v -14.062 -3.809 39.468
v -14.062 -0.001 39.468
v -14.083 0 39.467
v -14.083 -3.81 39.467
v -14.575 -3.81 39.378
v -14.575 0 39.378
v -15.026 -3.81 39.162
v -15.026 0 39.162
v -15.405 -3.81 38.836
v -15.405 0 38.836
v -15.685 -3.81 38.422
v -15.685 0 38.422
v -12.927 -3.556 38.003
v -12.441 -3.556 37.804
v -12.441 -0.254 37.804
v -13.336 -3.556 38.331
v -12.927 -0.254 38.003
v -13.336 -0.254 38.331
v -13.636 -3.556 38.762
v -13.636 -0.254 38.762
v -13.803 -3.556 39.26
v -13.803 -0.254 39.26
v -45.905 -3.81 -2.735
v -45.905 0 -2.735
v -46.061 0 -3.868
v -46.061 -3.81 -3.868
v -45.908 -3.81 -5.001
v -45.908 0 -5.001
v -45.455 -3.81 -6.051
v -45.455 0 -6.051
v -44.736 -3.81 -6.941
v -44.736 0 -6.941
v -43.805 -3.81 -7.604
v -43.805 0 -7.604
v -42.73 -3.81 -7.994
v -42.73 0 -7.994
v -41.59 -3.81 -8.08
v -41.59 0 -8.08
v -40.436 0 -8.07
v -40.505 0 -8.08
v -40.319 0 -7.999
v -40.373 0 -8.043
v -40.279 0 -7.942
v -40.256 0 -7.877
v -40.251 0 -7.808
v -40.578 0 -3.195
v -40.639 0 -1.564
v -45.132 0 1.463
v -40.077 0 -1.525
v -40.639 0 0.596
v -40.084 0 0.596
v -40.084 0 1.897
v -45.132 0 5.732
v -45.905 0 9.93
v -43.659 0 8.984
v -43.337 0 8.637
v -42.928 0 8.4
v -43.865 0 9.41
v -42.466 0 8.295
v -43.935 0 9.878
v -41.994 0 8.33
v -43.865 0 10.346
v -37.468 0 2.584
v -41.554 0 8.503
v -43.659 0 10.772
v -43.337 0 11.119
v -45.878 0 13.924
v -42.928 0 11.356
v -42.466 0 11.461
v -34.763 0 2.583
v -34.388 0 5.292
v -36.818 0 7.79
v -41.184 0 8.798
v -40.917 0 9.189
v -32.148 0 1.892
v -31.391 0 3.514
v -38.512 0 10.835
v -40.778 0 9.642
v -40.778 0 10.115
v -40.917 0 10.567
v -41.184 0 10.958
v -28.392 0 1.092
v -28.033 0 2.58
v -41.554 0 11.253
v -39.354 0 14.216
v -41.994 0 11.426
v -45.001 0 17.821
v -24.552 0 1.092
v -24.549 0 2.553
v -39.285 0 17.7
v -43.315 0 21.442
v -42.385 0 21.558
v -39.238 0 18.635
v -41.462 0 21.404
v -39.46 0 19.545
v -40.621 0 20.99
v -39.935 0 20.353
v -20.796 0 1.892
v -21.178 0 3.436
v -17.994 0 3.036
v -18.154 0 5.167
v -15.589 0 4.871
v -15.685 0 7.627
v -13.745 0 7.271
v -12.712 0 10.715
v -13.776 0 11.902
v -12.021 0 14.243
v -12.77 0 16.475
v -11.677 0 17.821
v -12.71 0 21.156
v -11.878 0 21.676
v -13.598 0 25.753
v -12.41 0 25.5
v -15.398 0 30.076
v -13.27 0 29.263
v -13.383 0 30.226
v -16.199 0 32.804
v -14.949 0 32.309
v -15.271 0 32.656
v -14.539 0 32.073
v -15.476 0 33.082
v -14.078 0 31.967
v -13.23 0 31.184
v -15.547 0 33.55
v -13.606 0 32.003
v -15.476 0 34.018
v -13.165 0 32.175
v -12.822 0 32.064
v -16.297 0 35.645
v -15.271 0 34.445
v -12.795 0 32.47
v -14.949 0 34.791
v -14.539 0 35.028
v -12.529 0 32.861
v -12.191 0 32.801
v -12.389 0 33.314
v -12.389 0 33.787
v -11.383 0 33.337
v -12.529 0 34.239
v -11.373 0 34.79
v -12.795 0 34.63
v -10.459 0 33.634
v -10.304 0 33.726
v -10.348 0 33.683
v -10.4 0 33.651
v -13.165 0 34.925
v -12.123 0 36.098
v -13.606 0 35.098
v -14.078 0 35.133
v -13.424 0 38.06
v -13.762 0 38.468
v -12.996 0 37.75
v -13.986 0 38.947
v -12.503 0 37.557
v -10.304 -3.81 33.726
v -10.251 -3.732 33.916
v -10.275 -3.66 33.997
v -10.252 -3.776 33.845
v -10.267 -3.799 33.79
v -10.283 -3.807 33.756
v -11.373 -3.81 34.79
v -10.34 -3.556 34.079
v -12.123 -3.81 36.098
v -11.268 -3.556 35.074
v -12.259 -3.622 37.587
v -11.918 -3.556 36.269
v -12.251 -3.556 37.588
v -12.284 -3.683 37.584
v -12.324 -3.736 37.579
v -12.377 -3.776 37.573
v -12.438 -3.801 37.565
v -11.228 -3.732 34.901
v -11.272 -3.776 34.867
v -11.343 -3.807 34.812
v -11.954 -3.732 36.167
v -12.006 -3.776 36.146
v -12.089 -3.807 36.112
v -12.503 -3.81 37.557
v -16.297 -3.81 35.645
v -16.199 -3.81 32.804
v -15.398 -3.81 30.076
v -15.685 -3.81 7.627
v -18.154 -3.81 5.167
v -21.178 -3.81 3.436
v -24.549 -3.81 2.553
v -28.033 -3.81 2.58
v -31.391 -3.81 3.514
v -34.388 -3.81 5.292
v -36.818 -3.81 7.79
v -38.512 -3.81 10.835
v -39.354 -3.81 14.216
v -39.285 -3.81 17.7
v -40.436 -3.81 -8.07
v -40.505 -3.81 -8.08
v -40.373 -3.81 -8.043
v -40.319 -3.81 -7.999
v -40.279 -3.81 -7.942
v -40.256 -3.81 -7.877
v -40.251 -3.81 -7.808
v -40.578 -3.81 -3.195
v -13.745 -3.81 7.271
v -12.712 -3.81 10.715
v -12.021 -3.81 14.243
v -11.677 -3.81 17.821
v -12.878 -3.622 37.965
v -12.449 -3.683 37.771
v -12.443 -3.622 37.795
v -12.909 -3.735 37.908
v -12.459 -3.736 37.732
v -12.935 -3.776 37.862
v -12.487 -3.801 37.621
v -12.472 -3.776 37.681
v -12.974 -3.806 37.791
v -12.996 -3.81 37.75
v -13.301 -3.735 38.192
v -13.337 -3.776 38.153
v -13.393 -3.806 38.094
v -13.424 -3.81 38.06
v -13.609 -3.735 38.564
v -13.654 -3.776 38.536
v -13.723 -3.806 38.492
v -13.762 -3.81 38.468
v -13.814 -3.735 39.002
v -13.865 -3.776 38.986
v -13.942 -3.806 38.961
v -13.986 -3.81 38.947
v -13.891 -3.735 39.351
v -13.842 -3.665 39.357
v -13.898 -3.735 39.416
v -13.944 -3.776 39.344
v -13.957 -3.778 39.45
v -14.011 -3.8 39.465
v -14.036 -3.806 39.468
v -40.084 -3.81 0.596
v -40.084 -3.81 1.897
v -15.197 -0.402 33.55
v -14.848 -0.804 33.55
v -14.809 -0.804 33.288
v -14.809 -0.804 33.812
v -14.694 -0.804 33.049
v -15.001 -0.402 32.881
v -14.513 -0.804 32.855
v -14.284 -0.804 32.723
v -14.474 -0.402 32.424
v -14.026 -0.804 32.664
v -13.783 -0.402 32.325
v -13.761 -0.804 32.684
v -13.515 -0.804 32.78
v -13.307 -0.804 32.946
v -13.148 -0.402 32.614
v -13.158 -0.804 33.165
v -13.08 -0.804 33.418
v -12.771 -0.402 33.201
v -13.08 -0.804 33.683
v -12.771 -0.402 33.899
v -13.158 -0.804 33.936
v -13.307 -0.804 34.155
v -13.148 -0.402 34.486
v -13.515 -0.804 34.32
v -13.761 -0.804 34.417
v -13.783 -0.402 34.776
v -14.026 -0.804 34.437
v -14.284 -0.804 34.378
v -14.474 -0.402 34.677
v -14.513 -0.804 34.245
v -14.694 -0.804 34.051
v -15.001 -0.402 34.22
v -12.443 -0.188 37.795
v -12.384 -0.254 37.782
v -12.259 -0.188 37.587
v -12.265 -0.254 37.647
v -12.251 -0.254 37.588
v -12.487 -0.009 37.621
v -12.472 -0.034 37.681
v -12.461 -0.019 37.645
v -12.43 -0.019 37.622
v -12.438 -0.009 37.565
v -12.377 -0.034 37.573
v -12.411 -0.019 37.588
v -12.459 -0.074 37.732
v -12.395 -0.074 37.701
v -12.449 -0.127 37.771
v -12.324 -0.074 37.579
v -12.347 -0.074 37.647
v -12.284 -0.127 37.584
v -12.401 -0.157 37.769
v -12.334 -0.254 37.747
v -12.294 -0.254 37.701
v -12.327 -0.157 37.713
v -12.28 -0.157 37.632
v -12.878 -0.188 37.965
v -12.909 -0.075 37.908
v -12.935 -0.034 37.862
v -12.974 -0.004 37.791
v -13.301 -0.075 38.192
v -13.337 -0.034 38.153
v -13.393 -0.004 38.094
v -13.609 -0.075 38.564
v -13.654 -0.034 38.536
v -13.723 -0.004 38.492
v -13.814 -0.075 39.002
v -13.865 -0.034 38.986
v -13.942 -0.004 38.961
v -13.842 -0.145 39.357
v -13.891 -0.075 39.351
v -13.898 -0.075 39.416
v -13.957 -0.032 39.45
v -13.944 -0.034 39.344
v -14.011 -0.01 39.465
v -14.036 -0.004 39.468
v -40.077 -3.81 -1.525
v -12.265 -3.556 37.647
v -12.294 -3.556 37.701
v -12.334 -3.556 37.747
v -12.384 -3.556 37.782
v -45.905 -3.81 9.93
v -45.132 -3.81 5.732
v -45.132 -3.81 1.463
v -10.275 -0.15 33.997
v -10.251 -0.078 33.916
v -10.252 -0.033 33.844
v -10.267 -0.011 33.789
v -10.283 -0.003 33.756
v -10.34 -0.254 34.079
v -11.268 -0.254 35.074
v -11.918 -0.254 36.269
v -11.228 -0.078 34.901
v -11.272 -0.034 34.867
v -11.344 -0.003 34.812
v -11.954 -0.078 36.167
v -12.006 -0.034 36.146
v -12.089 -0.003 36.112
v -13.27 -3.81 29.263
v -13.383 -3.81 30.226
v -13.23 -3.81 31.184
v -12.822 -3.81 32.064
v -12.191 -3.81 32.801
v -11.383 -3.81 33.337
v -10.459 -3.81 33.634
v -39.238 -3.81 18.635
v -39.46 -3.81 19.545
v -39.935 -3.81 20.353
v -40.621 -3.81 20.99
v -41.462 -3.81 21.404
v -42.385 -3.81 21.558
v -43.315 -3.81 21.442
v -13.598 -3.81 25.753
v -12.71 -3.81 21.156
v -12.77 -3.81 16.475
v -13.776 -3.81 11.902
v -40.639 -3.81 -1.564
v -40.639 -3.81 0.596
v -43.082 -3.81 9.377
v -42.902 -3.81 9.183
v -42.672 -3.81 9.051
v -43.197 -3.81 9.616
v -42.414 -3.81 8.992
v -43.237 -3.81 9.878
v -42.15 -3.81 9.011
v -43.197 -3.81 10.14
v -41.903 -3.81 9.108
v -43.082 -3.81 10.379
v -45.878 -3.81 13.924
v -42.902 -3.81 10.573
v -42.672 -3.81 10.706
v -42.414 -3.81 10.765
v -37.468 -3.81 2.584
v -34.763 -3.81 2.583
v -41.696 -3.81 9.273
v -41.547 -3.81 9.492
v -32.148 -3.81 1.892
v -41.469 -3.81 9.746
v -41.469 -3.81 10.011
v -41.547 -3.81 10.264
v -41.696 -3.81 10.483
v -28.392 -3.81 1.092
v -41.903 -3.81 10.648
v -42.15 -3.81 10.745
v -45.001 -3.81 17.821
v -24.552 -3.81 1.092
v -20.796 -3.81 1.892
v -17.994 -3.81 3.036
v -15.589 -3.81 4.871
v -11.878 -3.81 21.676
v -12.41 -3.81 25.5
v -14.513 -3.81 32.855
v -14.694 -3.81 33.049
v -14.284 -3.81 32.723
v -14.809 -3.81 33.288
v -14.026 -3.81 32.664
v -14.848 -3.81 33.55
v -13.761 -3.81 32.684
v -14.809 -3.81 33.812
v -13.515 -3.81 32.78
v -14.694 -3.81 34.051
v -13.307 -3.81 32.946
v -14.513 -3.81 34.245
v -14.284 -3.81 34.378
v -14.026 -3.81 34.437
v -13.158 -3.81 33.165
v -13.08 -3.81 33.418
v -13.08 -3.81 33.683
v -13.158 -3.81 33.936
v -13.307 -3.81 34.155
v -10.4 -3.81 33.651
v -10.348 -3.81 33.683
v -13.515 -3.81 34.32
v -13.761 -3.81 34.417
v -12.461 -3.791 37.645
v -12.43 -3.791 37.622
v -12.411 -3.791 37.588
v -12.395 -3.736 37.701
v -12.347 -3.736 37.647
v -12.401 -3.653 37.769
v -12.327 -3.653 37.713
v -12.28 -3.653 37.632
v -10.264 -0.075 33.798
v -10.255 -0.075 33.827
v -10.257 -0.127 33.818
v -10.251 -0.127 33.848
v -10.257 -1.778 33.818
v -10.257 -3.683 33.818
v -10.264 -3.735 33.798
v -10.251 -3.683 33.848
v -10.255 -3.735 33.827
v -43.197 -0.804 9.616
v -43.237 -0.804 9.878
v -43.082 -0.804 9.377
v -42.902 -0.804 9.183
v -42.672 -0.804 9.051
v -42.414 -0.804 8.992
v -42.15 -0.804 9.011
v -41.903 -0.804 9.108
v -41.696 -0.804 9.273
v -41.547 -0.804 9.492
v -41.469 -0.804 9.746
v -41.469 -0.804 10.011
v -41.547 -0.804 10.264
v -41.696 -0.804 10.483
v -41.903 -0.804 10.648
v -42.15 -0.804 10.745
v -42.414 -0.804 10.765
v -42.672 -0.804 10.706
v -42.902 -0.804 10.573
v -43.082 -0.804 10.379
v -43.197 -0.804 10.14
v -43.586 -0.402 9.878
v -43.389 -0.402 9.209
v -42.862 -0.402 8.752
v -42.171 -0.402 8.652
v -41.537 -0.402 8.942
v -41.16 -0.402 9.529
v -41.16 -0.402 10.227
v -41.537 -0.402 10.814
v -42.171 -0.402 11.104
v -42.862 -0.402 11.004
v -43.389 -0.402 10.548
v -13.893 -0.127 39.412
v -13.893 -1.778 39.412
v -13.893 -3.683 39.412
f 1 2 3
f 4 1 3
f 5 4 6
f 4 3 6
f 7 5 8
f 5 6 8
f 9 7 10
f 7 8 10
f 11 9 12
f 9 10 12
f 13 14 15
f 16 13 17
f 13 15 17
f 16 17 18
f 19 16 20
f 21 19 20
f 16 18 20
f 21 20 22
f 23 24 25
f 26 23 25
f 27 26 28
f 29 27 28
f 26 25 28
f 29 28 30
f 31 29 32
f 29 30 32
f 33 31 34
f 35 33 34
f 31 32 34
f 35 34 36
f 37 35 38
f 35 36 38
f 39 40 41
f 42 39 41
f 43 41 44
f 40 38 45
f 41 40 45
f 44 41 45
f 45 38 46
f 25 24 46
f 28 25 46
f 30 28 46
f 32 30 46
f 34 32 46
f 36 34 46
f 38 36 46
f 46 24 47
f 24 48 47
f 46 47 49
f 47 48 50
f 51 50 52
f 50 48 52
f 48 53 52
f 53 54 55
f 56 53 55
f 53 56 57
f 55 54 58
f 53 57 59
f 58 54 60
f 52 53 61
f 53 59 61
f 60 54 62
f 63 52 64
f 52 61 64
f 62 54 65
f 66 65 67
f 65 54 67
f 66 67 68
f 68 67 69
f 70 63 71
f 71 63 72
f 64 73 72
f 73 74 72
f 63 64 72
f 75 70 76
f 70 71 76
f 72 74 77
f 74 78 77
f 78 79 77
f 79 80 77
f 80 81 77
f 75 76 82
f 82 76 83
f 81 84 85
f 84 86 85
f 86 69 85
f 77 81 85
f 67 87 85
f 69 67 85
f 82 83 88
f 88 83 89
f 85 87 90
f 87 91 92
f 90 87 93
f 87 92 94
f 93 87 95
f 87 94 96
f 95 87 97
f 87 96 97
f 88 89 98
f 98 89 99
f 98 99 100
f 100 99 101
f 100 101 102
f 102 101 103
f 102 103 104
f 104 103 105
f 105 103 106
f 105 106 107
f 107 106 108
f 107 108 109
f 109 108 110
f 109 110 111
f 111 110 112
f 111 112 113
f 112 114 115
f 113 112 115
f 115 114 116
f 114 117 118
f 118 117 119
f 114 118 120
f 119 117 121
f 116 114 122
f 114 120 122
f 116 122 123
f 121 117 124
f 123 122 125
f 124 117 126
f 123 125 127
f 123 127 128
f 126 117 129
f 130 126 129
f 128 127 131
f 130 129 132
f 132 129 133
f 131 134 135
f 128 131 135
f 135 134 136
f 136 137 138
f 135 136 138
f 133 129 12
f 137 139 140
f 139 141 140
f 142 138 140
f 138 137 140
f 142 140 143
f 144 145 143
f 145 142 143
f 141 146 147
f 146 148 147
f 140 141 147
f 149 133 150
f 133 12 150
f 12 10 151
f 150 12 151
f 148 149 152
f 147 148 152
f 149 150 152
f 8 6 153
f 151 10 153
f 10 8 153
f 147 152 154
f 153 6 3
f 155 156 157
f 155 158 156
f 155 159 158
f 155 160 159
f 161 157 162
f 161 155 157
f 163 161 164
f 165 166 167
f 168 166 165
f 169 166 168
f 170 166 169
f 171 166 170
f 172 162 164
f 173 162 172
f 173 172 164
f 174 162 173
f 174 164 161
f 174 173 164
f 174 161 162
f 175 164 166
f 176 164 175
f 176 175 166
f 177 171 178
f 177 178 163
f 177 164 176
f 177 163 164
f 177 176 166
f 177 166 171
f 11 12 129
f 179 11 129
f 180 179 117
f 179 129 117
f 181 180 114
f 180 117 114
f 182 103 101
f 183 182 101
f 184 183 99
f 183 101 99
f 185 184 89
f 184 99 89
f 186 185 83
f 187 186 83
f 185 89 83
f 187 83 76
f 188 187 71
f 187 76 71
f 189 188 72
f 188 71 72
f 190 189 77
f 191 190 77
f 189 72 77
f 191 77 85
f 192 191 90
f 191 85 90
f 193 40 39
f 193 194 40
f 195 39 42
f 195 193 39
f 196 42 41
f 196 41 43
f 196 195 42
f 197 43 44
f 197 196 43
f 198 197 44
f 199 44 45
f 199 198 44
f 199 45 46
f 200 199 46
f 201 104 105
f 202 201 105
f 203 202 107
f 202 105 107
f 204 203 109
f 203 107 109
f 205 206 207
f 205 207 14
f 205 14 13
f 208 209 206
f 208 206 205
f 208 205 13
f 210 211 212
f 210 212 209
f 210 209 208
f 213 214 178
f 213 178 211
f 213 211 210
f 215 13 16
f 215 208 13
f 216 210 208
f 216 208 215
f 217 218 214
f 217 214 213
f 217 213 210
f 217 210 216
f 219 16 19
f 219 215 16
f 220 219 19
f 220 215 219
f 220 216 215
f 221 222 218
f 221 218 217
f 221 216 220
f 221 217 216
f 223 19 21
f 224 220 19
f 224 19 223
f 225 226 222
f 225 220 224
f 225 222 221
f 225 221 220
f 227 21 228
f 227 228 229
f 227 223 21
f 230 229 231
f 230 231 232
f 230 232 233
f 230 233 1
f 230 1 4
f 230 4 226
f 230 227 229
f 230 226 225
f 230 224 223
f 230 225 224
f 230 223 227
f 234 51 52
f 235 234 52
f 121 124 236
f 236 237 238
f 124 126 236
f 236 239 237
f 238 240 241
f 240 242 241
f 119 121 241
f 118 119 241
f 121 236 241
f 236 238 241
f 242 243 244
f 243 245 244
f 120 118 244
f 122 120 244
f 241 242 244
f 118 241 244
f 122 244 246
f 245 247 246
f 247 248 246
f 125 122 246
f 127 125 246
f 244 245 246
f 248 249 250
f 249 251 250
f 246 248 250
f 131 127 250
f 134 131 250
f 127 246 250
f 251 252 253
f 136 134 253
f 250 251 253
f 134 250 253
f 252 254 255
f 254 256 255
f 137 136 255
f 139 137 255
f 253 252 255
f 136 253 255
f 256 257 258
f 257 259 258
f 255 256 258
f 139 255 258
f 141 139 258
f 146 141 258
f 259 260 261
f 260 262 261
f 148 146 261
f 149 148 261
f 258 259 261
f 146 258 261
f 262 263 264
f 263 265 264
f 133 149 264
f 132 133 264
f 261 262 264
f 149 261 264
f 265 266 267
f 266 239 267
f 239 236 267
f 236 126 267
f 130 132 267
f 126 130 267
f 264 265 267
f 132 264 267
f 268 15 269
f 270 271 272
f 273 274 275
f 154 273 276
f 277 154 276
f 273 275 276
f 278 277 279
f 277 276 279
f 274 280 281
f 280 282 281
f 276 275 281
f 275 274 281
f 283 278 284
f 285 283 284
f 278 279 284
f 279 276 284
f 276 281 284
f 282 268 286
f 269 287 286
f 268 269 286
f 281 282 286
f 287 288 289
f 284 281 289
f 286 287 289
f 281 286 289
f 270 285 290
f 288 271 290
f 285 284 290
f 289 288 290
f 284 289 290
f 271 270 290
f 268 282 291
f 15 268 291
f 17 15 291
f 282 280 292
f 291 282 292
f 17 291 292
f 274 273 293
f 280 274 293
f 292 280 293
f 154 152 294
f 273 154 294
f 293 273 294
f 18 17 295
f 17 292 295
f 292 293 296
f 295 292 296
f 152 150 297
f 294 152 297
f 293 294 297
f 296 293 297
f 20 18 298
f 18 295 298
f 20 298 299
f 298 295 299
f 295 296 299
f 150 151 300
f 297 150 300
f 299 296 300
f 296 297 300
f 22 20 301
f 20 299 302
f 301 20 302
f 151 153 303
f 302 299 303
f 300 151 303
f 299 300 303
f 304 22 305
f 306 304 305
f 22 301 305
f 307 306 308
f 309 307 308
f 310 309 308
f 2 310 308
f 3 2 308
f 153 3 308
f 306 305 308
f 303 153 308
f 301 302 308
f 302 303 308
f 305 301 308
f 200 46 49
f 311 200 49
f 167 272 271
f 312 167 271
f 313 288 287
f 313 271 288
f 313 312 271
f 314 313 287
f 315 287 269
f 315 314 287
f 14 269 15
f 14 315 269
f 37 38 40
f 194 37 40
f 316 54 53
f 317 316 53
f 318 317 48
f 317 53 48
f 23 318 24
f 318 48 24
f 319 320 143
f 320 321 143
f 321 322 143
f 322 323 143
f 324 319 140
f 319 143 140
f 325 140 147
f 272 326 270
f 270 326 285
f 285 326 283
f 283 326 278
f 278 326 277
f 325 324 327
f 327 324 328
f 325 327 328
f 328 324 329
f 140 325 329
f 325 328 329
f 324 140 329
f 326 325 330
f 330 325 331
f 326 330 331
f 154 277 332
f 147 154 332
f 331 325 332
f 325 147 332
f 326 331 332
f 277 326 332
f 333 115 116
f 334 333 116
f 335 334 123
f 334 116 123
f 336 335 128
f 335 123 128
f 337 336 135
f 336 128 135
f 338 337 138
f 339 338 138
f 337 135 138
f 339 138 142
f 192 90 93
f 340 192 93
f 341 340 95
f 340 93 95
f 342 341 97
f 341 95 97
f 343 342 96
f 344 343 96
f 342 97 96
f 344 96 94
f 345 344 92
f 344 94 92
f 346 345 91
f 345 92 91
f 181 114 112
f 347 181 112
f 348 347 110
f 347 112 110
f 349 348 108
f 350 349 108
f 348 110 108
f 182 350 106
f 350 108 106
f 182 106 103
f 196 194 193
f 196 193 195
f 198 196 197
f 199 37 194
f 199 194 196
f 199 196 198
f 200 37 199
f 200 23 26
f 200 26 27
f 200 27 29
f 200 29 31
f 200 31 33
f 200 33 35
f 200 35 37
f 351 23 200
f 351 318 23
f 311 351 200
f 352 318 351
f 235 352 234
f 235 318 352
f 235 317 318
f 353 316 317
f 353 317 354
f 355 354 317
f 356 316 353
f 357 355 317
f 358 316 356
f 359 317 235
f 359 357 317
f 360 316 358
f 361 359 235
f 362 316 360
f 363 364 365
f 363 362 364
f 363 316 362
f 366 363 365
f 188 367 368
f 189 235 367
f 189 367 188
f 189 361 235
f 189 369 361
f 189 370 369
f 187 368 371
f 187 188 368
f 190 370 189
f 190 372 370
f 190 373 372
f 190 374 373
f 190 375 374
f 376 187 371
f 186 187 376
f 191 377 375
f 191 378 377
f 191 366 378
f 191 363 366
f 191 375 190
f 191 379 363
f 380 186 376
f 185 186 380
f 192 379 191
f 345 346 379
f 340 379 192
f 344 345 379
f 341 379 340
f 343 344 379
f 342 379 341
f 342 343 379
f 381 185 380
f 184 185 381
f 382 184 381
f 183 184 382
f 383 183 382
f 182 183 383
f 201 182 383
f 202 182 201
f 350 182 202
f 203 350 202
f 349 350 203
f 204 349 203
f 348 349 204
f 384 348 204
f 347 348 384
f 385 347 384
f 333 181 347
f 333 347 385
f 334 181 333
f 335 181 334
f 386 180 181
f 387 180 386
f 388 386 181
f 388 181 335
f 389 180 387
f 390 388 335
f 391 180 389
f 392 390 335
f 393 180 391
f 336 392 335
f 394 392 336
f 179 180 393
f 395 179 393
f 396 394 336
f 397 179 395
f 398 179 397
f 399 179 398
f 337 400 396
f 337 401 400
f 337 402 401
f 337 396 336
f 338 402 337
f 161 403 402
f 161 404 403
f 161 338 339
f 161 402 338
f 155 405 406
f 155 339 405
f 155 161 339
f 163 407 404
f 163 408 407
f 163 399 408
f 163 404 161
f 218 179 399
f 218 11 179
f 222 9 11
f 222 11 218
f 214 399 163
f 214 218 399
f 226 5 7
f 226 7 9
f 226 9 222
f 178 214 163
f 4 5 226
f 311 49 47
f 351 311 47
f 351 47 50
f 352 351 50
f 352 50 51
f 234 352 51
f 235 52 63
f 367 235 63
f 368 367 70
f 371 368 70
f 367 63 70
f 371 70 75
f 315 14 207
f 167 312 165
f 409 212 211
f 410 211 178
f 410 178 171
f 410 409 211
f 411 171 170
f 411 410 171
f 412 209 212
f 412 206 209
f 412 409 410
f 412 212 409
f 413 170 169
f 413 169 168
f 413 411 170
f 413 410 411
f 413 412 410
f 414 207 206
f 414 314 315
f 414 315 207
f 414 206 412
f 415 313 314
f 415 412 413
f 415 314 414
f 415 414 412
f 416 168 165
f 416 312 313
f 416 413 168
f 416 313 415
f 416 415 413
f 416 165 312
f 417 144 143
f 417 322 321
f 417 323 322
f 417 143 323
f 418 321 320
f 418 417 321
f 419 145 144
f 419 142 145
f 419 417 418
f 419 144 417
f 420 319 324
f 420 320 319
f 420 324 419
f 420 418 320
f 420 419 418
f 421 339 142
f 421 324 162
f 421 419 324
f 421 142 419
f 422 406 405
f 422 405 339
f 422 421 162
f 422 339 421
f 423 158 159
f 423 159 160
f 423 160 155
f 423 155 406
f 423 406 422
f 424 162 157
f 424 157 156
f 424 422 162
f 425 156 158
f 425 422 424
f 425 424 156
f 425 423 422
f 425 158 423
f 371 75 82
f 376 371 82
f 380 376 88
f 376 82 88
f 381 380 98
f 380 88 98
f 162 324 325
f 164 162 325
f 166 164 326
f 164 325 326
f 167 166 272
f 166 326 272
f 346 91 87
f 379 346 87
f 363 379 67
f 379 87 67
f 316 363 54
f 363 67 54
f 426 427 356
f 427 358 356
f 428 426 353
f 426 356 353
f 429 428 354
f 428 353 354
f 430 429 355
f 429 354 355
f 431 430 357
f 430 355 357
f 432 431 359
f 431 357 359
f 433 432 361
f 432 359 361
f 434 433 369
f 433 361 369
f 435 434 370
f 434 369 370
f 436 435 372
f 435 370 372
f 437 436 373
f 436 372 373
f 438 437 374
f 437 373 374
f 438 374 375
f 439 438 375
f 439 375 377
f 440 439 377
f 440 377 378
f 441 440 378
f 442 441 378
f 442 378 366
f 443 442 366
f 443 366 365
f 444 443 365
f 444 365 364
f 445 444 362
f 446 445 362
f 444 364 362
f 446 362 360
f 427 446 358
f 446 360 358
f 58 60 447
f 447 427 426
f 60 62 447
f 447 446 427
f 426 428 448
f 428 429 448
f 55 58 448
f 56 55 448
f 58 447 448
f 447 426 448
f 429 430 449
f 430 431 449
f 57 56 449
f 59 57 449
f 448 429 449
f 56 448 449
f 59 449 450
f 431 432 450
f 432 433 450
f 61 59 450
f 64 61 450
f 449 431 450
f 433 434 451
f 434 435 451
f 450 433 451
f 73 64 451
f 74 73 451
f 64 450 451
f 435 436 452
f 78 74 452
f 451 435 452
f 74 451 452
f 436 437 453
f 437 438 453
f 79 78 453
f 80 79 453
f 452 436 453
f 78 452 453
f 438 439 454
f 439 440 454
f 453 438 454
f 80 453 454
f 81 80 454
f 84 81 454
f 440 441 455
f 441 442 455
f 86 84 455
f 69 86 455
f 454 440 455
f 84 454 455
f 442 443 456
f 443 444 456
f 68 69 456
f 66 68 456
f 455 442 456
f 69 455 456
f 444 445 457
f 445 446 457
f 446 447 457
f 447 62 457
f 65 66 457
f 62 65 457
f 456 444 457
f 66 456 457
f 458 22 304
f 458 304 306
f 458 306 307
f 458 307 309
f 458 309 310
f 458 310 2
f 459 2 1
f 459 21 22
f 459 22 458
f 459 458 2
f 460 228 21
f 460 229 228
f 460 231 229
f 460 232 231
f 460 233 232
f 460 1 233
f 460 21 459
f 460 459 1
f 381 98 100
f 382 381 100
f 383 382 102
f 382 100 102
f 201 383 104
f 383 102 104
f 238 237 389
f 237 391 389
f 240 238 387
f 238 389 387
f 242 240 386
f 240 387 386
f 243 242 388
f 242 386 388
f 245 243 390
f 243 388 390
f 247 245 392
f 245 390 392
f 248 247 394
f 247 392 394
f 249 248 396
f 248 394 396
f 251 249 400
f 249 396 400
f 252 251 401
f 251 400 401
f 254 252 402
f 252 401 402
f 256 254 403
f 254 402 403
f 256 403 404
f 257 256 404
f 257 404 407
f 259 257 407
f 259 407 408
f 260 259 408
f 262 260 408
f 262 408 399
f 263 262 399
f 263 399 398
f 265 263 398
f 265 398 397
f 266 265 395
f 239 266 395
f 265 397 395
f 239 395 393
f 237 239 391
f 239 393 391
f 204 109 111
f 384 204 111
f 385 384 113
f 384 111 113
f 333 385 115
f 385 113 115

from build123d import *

# Parameters (mm, degrees)
F1_DEPTH       = 3.81
F2_R           = 0.254
F3_D           = 1.778
F3_CSINK_D     = 3.175
F3_CSINK_ANGLE = 82


# Not quite as in the source:
# - a feature names something its author has since deleted; it is built from what else it names


with BuildPart() as f1:
    # F0 (on Front) → F1 (new body)
    with BuildSketch(Plane.XZ):
        with BuildLine():
            ThreePointArc((-15.3976073489, 30.0757028162), (-12.6205023663, 18.8138288447), (-15.6854130328, 7.6268524863))
            ThreePointArc((-15.6854130328, 7.6268524863), (-31.3905262472, 3.5144175537), (-39.2854884267, 17.7000537515))
            ThreePointArc((-39.2854884267, 17.7000537515), (-40.2547680717, 20.6965618199), (-43.3147661388, 21.4415285736))
            ThreePointArc((-43.3147661388, 21.4415285736), (-45.5440273695, 15.8957464039), (-45.905020088, 9.9295927212))
            ThreePointArc((-45.905020088, 9.9295927212), (-45.0345404234, 3.597348812), (-45.905020088, -2.7348950971))
            ThreePointArc((-45.905020088, -2.7348950971), (-45.1259294206, -6.5201466433), (-41.5899753571, -8.0796787515))
            Line((-41.5899753571, -8.0796787515), (-40.2320445972, -8.0796787515))
            Line((-40.2320445972, -8.0796787515), (-40.5776619182, -3.1953468446))
            Line((-40.5776619182, -3.1953468446), (-40.0765932374, -1.5246287875))
            Line((-40.0765932374, -1.5246287875), (-40.6392291188, -1.5644411324))
            Line((-40.6392291188, -1.5644411324), (-40.6392291188, 0.5960793933))
            Line((-40.6392291188, 0.5960793933), (-40.0844532998, 0.5960793933))
            Line((-40.0844532998, 0.5960793933), (-40.0844532998, 1.8968694892))
            ThreePointArc((-40.0844532998, 1.8968694892), (-36.1157211919, 2.6708049351), (-32.1480344873, 1.8915278128))
            ThreePointArc((-32.1480344873, 1.8915278128), (-26.4720596319, 0.9912977201), (-20.7960847765, 1.8915278128))
            ThreePointArc((-20.7960847765, 1.8915278128), (-16.7308465178, 3.8739299722), (-13.7448431924, 7.2709675878))
            ThreePointArc((-13.7448431924, 7.2709675878), (-12.3233048625, 12.470180408), (-11.6768007285, 17.821312772))
            ThreePointArc((-11.6768007285, 17.821312772), (-12.1024444853, 23.5936908911), (-13.2695324719, 29.2628555023))
            ThreePointArc((-13.2695324719, 29.2628555023), (-12.6323011565, 32.3319998397), (-9.8052835092, 33.6861349642))
            ThreePointArc((-9.8052835092, 33.6861349642), (-11.5106118889, 35.4421925399), (-12.2696207836, 37.7693772316))
            ThreePointArc((-12.2696207836, 37.7693772316), (-13.3462306374, 38.3418830024), (-13.8277616352, 39.4621416926))
            ThreePointArc((-13.8277616352, 39.4621416926), (-14.9168802382, 39.2283992754), (-15.6854130328, 38.4220667183))
            ThreePointArc((-15.6854130328, 38.4220667183), (-16.3374101507, 34.221439938), (-15.3976073489, 30.0757028162))
        make_face()
    extrude(amount=F1_DEPTH)

    # F2
    f2_edges = [f1.edges().sort_by_distance(p)[0] for p in [
        (-45.90502, -1.905, -2.734895),
        (-13.827762, -1.905, 39.462142),
        (-12.269621, -1.905, 37.769377),
        (-13.346231, 0, 38.341883),
        (-13.346231, -3.81, 38.341883),
        (-11.510612, -3.81, 35.442193),
        (-11.510612, 0, 35.442193),
        (-9.805284, -1.905, 33.686135),
        (-40.232045, -1.905, -8.079679),
    ]]
    fillet(f2_edges, radius=F2_R)

    # F3 (through all)
    with Locations(Plane(origin=(0, 0, 0), x_dir=(1, 0, 0), z_dir=(0, 1, 0))):
        with Locations((-42.347650975, -9.8781445995), (-13.9591796324, -33.550273627)):
            CounterSinkHole(F3_D / 2, F3_CSINK_D / 2, counter_sink_angle=F3_CSINK_ANGLE)


solid = f1.part
